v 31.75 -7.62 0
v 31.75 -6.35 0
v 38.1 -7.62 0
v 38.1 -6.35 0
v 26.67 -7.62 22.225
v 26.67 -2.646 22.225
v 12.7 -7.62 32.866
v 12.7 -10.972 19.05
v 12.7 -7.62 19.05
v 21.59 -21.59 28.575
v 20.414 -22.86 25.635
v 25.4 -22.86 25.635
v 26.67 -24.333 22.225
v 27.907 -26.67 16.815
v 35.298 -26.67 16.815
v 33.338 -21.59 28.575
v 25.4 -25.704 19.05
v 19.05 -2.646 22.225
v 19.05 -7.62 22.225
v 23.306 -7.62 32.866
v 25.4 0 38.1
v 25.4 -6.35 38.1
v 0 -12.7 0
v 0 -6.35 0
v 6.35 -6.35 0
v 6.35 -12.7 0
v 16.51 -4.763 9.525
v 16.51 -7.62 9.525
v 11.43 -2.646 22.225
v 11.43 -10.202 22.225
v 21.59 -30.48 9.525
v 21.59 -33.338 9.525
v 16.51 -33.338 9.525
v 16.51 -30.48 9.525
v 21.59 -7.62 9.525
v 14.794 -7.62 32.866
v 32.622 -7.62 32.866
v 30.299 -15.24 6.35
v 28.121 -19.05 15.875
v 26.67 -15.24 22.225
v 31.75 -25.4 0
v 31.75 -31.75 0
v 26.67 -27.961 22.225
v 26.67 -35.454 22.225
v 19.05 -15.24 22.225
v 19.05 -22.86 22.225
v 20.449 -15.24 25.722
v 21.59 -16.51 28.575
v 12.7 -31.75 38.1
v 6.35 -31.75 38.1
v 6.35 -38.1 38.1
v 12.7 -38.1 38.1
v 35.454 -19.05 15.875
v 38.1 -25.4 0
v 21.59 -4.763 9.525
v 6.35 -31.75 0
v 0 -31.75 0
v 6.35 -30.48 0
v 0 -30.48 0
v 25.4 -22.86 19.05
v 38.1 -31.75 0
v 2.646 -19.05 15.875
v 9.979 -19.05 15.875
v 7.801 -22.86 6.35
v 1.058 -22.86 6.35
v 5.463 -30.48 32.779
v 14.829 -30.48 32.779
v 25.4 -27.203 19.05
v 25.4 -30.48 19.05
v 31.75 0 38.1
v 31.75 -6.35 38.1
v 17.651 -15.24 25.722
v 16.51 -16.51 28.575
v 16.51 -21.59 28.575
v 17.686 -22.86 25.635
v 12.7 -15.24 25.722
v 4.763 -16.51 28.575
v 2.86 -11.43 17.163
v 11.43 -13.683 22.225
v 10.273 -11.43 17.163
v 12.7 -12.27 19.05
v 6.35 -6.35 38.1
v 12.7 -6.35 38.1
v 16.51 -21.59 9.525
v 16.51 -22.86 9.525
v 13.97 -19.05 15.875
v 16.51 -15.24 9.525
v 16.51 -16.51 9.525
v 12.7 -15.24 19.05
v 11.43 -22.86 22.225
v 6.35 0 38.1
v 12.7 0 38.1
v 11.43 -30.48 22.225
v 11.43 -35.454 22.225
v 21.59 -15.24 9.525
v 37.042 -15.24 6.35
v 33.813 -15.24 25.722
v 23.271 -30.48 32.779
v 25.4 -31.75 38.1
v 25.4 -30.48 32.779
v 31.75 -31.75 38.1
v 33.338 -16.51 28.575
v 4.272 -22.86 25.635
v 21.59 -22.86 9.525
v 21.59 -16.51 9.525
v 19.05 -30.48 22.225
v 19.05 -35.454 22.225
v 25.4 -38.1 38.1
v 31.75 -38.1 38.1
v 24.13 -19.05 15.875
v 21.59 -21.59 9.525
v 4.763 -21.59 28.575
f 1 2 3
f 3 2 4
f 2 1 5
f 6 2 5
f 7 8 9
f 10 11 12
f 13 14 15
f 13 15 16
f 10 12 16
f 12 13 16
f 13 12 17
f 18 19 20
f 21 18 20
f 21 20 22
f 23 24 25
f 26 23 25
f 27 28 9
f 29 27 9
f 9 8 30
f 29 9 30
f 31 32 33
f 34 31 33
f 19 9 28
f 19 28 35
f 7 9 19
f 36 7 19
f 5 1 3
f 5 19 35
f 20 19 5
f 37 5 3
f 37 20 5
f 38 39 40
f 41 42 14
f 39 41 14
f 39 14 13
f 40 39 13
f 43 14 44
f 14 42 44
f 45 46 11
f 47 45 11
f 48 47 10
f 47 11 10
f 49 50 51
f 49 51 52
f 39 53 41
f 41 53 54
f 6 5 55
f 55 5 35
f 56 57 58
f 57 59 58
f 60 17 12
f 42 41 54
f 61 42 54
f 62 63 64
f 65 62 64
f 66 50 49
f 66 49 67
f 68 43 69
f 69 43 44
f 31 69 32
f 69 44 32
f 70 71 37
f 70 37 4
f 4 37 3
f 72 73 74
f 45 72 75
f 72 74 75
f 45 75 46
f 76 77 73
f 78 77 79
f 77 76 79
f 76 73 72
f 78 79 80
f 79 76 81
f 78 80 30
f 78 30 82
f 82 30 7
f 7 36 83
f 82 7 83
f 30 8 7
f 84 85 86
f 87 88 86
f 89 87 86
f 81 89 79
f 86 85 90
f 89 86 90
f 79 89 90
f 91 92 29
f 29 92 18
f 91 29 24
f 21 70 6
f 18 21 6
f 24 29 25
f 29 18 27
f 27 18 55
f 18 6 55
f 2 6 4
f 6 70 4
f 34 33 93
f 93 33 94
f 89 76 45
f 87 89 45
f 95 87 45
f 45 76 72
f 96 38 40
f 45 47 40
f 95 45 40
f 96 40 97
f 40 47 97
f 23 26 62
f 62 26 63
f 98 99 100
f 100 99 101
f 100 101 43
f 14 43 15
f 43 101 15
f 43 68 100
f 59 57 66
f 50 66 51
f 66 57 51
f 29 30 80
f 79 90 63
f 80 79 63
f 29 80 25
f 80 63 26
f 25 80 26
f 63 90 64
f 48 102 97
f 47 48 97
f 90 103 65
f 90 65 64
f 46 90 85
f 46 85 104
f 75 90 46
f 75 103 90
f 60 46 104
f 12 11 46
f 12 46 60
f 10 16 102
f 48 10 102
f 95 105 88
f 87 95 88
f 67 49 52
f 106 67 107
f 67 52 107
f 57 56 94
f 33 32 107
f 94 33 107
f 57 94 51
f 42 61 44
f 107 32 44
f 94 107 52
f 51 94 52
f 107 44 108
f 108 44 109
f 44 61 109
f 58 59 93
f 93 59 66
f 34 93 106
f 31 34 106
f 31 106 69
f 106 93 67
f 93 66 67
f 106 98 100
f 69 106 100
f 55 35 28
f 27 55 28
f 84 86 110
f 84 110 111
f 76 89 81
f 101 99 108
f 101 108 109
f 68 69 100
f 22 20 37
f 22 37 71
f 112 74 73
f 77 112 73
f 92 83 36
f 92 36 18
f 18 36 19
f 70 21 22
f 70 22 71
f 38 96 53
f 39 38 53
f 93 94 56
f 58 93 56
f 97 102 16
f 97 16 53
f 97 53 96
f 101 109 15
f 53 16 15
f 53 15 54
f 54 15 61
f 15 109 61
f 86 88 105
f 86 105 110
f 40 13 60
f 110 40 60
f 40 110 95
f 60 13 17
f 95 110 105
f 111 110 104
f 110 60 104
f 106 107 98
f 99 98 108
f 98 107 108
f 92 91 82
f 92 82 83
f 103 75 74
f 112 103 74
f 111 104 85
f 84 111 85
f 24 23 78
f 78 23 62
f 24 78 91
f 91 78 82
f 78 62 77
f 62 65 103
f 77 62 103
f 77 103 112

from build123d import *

# Parameters (mm, degrees)
F0_W     = 38.1
F0_H     = 38.1
F1_DEPTH = 38.1
F5_DEPTH = 38.1
F7_DEPTH = 38.1
F8_W     = 25.4
F8_H     = 7.62
F9_DEPTH = 38.1


with BuildPart() as f1:
    # F0 (on Front) → F1 (new body)
    with BuildSketch(Plane.XZ):
        with Locations((19.05, 19.05)):
            Rectangle(F0_W, F0_H)
    extrude(amount=F1_DEPTH)

    # F4 (on face) → F5 (cut)
    with BuildSketch(Plane.YZ.offset(38.1)):
        Polygon((-6.35, 38.1), (-31.75, 38.1), (-26.67, 16.814783), (-21.59, 28.575), (-16.51, 28.575), (-11.43, 17.16294), align=None)
        Polygon((-31.75, 0), (-38.1, 38.1), (-38.1, 0), align=None)
        Polygon((-19.05, 15.875), (-25.4, 0), (-12.7, 0), align=None)
        Polygon((0, 0), (0, 38.1), (-6.35, 0), align=None)
    extrude(amount=-F5_DEPTH, mode=Mode.SUBTRACT)

    # F6 (on offset) → F7 (cut)
    with BuildSketch(Plane.XZ.offset(38.1)):
        Polygon((0, 38.1), (0, 0), (6.35, 38.1), align=None)
        Polygon((11.43, 22.225), (6.35, 0), (31.75, 0), (26.67, 22.225), (21.59, 9.525), (16.51, 9.525), align=None)
        Polygon((25.4, 38.1), (12.7, 38.1), (19.05, 22.225), align=None)
        Polygon((31.75, 38.1), (38.1, 0), (38.1, 38.1), align=None)
    extrude(amount=-F7_DEPTH, mode=Mode.SUBTRACT)

    # F8 (on offset) → F9 (cut)
    with BuildSketch(Plane.XY.offset(38.1)):
        with Locations((25.4, -11.43)):
            Rectangle(F8_W, F8_H)
        with Locations((12.7, -26.67)):
            Rectangle(F8_W, F8_H)
    extrude(amount=-F9_DEPTH, mode=Mode.SUBTRACT)


solid = f1.part
